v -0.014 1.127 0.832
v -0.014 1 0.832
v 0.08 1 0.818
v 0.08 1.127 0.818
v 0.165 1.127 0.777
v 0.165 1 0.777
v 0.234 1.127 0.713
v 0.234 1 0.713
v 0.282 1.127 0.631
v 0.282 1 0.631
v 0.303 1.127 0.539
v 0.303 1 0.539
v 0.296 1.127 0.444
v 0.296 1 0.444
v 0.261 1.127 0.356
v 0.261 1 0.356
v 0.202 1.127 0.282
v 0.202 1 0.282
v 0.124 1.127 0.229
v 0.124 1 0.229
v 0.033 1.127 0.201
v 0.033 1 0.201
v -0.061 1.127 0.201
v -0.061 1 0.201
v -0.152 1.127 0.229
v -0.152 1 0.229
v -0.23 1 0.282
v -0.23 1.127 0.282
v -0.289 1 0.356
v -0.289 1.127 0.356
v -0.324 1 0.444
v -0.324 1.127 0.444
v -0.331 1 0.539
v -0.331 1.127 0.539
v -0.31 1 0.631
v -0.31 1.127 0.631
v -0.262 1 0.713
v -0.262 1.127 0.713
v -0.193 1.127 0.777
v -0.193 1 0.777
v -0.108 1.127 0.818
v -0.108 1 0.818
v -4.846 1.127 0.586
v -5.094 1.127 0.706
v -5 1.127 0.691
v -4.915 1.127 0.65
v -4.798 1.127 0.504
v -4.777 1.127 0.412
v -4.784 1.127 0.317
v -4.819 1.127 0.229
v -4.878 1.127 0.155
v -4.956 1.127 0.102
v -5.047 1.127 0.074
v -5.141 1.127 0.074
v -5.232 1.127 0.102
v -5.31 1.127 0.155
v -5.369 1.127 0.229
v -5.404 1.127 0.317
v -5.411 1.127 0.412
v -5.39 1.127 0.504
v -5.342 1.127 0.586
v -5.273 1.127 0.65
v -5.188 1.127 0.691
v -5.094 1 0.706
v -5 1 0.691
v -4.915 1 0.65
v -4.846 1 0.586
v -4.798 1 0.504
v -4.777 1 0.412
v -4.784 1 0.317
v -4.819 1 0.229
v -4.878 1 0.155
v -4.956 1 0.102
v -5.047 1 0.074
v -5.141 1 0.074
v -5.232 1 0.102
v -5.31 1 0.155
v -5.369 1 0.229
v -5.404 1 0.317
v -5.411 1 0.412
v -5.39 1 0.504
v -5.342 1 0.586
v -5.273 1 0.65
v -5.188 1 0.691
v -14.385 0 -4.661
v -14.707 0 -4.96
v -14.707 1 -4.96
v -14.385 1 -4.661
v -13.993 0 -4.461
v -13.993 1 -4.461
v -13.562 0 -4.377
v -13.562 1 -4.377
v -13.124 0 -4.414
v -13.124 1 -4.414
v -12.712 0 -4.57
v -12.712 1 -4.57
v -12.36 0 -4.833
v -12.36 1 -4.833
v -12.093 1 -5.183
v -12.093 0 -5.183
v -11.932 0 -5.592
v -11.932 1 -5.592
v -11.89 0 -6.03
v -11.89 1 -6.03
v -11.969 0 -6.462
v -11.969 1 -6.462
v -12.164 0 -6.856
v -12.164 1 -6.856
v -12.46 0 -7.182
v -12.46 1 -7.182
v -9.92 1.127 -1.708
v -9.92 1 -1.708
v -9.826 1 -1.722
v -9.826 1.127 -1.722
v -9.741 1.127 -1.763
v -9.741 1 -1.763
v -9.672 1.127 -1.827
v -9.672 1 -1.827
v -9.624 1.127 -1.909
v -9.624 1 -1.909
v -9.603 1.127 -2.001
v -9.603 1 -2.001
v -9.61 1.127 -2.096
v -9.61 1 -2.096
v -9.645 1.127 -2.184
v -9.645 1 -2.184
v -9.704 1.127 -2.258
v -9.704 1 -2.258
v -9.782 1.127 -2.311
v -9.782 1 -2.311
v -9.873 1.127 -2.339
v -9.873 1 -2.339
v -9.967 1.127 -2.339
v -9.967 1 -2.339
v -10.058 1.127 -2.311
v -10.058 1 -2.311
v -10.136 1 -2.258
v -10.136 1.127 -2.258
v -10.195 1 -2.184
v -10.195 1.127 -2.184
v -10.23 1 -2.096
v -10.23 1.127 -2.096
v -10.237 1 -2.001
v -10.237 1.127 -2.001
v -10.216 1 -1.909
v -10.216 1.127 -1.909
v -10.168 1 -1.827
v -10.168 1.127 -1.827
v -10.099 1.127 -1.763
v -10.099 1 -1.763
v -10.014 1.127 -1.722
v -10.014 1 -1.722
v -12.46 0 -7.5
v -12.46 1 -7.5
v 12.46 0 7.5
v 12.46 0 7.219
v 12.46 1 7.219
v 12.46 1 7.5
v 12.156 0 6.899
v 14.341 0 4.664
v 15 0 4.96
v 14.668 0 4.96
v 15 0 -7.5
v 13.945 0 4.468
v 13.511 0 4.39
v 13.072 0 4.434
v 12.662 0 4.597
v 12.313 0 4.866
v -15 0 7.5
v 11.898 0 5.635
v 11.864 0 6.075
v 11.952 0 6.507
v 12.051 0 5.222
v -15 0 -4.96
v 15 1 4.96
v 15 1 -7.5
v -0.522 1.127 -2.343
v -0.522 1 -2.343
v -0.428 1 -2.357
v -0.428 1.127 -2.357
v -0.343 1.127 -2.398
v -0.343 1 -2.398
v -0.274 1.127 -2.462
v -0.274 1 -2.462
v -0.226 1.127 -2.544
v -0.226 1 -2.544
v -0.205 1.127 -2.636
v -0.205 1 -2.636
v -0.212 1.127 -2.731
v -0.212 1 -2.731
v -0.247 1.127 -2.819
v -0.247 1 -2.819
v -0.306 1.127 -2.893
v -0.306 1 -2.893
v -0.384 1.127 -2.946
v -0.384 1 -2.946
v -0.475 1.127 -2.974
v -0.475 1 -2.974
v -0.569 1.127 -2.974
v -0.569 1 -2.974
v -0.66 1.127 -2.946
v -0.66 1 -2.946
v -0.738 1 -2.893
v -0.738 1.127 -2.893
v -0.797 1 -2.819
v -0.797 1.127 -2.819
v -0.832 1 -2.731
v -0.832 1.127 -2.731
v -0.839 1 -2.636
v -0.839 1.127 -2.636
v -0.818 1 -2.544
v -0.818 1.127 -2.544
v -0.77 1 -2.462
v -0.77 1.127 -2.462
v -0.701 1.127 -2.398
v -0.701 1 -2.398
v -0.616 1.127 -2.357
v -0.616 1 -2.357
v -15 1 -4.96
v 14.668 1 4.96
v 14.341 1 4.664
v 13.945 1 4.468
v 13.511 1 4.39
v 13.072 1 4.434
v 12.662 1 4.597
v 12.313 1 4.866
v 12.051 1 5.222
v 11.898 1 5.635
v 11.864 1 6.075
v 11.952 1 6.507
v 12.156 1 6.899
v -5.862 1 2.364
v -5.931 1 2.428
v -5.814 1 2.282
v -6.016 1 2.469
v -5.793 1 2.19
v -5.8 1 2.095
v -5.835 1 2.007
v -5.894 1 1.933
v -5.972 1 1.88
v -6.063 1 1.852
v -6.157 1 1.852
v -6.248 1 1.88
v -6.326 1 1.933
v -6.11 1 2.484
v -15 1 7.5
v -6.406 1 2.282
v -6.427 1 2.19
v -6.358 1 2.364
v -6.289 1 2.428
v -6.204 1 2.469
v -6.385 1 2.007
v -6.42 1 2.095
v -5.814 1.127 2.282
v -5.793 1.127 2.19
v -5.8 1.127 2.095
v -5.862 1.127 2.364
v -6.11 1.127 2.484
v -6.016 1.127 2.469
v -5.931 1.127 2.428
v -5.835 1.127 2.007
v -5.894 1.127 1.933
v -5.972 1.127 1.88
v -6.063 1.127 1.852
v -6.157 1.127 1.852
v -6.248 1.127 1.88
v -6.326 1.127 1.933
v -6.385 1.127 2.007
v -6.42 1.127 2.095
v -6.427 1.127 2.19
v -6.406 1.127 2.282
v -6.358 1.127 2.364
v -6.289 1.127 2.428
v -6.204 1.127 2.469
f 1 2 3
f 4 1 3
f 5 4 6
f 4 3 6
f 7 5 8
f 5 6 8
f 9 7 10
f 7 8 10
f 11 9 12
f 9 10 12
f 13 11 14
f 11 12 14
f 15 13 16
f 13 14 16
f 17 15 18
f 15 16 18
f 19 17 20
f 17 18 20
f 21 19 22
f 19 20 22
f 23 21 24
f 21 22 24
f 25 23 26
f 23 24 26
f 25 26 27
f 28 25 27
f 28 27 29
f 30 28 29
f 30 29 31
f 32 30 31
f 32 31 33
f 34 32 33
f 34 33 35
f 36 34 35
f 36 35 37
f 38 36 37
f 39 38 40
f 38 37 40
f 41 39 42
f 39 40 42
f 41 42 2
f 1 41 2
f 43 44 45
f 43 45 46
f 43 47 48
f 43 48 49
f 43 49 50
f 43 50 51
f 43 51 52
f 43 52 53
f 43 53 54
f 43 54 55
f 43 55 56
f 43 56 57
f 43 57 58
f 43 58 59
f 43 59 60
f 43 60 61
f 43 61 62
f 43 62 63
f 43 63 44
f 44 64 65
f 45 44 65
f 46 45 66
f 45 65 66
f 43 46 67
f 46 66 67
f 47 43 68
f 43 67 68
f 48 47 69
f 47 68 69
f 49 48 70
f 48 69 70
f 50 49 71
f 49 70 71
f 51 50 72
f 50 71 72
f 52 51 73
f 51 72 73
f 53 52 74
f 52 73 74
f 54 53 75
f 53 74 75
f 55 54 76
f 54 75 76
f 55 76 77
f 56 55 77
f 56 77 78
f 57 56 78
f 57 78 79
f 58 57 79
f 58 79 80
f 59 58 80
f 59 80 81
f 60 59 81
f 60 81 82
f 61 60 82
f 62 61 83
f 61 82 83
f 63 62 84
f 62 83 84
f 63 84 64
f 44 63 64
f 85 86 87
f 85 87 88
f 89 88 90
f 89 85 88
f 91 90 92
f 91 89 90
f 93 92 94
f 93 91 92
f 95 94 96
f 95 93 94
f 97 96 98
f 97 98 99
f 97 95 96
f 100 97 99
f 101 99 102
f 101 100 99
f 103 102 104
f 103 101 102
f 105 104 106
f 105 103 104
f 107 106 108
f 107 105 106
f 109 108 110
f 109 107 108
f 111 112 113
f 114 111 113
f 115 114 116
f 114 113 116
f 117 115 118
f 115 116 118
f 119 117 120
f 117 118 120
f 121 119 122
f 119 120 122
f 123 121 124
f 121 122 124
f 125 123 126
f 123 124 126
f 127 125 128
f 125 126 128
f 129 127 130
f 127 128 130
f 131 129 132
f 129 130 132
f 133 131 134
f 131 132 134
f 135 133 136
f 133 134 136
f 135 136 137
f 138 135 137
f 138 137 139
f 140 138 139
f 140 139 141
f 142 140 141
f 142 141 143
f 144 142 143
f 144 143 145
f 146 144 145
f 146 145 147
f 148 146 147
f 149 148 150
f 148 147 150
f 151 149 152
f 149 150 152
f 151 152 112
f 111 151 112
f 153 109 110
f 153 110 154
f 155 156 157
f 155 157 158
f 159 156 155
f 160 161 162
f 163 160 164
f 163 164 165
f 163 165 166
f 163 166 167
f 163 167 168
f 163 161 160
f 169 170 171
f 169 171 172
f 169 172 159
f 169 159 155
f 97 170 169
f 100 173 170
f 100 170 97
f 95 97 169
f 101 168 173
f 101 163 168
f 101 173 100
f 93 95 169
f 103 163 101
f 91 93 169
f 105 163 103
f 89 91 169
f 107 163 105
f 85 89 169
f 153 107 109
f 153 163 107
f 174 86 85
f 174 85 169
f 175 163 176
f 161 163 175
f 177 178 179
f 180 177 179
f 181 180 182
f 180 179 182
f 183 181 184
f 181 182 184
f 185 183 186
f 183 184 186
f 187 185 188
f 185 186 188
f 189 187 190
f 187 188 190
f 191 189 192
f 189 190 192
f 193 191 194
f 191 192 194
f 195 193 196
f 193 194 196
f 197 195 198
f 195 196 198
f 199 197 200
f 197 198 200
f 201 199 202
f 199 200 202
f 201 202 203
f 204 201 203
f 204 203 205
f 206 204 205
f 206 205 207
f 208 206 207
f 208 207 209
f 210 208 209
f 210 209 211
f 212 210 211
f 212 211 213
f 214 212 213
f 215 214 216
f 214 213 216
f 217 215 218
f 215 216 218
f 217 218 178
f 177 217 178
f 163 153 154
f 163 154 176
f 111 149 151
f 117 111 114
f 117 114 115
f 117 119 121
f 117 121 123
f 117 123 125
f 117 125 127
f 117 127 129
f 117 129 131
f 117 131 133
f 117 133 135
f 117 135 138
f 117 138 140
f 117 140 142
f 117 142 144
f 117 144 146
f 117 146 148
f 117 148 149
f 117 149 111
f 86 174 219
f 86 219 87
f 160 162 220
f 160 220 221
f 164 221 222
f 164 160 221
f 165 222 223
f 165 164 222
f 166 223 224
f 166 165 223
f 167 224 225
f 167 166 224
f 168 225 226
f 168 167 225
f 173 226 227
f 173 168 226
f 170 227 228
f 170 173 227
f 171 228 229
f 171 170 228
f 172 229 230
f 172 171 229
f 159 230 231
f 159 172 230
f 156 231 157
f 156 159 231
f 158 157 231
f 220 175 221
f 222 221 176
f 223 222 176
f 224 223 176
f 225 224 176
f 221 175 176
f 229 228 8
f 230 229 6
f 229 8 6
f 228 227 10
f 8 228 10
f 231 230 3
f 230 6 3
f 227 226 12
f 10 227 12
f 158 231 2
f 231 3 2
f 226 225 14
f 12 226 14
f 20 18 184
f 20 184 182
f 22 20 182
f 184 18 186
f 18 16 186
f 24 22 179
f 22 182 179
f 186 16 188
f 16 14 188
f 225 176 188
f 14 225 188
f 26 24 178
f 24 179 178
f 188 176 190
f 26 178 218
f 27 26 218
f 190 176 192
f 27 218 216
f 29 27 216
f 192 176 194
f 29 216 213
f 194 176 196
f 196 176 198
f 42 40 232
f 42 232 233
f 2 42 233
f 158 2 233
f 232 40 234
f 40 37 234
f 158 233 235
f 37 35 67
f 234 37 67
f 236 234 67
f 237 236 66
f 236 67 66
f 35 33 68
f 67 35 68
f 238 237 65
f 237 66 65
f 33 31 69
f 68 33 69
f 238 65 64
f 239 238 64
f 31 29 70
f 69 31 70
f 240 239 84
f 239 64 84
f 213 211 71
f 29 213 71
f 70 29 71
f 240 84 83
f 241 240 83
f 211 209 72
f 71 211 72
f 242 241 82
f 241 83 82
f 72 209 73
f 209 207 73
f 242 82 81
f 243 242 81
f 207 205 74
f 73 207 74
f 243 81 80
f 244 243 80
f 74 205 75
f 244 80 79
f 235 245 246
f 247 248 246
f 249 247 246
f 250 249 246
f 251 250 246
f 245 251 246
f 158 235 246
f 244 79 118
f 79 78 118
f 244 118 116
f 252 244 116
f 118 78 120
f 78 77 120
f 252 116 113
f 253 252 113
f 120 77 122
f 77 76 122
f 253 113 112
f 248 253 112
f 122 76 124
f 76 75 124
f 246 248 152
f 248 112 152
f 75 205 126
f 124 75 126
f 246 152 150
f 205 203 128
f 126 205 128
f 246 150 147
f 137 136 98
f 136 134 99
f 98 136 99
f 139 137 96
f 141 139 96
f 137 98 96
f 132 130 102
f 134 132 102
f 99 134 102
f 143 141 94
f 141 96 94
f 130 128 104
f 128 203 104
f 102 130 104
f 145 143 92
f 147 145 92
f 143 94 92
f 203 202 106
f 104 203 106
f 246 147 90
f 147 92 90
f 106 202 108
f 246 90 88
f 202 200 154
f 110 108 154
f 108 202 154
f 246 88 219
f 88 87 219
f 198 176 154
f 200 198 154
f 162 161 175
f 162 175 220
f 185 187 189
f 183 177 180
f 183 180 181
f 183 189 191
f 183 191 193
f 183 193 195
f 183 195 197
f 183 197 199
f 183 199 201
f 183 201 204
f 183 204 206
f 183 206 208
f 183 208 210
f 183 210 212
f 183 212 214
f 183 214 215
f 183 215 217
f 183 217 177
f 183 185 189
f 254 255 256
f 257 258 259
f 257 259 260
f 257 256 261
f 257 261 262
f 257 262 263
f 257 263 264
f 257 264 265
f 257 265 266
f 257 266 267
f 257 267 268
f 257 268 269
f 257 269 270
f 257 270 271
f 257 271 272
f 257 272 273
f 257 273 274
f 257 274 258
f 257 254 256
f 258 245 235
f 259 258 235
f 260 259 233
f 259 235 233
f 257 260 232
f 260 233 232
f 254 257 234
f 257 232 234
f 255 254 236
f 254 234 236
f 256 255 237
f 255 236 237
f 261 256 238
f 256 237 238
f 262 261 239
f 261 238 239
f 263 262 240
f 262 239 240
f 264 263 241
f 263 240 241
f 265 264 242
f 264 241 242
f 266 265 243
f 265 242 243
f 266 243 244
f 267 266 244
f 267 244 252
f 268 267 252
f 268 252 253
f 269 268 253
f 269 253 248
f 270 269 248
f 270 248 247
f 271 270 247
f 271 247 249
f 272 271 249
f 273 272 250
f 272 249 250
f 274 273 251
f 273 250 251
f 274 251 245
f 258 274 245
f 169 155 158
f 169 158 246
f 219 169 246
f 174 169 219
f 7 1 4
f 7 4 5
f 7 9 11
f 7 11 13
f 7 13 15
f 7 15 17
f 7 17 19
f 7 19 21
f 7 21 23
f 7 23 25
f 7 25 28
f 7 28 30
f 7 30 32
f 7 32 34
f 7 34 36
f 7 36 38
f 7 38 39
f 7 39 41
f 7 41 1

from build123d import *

# Parameters (mm, degrees)
BOSS_EXTRUDE1_DEPTH = 1
SKETCH2_R           = 0.3175
BOSS_EXTRUDE2_DEPTH = 0.127


with BuildPart() as part:
    # Sketch1 → Boss-Extrude1 (new body)
    with BuildSketch(Plane(origin=(0, 0, 0), x_dir=(1, 0, 0), z_dir=(0, 1, 0))):
        with BuildLine():
            Line((-12.46, 7.5), (15, 7.5))
            Line((15, 7.5), (15, -4.96))
            Line((15, -4.96), (14.667795167, -4.96))
            ThreePointArc((14.667795167, -4.96), (12.312776928, -4.866304174), (12.46, -7.218582895))
            Line((12.46, -7.218582895), (12.46, -7.5))
            Line((12.46, -7.5), (-15, -7.5))
            Line((-15, -7.5), (-15, 4.96))
            Line((-15, 4.96), (-14.707321343, 4.96))
            ThreePointArc((-14.707321343, 4.96), (-12.359897737, 4.833074853), (-12.46, 7.181795167))
            Line((-12.46, 7.181795167), (-12.46, 7.5))
        make_face()
    extrude(amount=BOSS_EXTRUDE1_DEPTH)

    # Sketch2 → Boss-Extrude2 (add)
    with BuildSketch(Plane(origin=(0, 1, 0), x_dir=(1, 0, 0), z_dir=(0, 1, 0))):
        with Locations(Location((-9.92, 2.025, 0), (0, 0, 270))):
            Circle(SKETCH2_R)
        with Locations(Location((-5.094, -0.388, 0), (0, 0, 270))):
            Circle(SKETCH2_R)
        with Locations(Location((-6.11, -2.166, 0), (0, 0, 270))):
            Circle(SKETCH2_R)
        with Locations(Location((-0.522, 2.66, 0), (0, 0, 270))):
            Circle(SKETCH2_R)
        with Locations(Location((-0.014, -0.515, 0), (0, 0, 270))):
            Circle(SKETCH2_R)
    extrude(amount=BOSS_EXTRUDE2_DEPTH)


solid = part.part
